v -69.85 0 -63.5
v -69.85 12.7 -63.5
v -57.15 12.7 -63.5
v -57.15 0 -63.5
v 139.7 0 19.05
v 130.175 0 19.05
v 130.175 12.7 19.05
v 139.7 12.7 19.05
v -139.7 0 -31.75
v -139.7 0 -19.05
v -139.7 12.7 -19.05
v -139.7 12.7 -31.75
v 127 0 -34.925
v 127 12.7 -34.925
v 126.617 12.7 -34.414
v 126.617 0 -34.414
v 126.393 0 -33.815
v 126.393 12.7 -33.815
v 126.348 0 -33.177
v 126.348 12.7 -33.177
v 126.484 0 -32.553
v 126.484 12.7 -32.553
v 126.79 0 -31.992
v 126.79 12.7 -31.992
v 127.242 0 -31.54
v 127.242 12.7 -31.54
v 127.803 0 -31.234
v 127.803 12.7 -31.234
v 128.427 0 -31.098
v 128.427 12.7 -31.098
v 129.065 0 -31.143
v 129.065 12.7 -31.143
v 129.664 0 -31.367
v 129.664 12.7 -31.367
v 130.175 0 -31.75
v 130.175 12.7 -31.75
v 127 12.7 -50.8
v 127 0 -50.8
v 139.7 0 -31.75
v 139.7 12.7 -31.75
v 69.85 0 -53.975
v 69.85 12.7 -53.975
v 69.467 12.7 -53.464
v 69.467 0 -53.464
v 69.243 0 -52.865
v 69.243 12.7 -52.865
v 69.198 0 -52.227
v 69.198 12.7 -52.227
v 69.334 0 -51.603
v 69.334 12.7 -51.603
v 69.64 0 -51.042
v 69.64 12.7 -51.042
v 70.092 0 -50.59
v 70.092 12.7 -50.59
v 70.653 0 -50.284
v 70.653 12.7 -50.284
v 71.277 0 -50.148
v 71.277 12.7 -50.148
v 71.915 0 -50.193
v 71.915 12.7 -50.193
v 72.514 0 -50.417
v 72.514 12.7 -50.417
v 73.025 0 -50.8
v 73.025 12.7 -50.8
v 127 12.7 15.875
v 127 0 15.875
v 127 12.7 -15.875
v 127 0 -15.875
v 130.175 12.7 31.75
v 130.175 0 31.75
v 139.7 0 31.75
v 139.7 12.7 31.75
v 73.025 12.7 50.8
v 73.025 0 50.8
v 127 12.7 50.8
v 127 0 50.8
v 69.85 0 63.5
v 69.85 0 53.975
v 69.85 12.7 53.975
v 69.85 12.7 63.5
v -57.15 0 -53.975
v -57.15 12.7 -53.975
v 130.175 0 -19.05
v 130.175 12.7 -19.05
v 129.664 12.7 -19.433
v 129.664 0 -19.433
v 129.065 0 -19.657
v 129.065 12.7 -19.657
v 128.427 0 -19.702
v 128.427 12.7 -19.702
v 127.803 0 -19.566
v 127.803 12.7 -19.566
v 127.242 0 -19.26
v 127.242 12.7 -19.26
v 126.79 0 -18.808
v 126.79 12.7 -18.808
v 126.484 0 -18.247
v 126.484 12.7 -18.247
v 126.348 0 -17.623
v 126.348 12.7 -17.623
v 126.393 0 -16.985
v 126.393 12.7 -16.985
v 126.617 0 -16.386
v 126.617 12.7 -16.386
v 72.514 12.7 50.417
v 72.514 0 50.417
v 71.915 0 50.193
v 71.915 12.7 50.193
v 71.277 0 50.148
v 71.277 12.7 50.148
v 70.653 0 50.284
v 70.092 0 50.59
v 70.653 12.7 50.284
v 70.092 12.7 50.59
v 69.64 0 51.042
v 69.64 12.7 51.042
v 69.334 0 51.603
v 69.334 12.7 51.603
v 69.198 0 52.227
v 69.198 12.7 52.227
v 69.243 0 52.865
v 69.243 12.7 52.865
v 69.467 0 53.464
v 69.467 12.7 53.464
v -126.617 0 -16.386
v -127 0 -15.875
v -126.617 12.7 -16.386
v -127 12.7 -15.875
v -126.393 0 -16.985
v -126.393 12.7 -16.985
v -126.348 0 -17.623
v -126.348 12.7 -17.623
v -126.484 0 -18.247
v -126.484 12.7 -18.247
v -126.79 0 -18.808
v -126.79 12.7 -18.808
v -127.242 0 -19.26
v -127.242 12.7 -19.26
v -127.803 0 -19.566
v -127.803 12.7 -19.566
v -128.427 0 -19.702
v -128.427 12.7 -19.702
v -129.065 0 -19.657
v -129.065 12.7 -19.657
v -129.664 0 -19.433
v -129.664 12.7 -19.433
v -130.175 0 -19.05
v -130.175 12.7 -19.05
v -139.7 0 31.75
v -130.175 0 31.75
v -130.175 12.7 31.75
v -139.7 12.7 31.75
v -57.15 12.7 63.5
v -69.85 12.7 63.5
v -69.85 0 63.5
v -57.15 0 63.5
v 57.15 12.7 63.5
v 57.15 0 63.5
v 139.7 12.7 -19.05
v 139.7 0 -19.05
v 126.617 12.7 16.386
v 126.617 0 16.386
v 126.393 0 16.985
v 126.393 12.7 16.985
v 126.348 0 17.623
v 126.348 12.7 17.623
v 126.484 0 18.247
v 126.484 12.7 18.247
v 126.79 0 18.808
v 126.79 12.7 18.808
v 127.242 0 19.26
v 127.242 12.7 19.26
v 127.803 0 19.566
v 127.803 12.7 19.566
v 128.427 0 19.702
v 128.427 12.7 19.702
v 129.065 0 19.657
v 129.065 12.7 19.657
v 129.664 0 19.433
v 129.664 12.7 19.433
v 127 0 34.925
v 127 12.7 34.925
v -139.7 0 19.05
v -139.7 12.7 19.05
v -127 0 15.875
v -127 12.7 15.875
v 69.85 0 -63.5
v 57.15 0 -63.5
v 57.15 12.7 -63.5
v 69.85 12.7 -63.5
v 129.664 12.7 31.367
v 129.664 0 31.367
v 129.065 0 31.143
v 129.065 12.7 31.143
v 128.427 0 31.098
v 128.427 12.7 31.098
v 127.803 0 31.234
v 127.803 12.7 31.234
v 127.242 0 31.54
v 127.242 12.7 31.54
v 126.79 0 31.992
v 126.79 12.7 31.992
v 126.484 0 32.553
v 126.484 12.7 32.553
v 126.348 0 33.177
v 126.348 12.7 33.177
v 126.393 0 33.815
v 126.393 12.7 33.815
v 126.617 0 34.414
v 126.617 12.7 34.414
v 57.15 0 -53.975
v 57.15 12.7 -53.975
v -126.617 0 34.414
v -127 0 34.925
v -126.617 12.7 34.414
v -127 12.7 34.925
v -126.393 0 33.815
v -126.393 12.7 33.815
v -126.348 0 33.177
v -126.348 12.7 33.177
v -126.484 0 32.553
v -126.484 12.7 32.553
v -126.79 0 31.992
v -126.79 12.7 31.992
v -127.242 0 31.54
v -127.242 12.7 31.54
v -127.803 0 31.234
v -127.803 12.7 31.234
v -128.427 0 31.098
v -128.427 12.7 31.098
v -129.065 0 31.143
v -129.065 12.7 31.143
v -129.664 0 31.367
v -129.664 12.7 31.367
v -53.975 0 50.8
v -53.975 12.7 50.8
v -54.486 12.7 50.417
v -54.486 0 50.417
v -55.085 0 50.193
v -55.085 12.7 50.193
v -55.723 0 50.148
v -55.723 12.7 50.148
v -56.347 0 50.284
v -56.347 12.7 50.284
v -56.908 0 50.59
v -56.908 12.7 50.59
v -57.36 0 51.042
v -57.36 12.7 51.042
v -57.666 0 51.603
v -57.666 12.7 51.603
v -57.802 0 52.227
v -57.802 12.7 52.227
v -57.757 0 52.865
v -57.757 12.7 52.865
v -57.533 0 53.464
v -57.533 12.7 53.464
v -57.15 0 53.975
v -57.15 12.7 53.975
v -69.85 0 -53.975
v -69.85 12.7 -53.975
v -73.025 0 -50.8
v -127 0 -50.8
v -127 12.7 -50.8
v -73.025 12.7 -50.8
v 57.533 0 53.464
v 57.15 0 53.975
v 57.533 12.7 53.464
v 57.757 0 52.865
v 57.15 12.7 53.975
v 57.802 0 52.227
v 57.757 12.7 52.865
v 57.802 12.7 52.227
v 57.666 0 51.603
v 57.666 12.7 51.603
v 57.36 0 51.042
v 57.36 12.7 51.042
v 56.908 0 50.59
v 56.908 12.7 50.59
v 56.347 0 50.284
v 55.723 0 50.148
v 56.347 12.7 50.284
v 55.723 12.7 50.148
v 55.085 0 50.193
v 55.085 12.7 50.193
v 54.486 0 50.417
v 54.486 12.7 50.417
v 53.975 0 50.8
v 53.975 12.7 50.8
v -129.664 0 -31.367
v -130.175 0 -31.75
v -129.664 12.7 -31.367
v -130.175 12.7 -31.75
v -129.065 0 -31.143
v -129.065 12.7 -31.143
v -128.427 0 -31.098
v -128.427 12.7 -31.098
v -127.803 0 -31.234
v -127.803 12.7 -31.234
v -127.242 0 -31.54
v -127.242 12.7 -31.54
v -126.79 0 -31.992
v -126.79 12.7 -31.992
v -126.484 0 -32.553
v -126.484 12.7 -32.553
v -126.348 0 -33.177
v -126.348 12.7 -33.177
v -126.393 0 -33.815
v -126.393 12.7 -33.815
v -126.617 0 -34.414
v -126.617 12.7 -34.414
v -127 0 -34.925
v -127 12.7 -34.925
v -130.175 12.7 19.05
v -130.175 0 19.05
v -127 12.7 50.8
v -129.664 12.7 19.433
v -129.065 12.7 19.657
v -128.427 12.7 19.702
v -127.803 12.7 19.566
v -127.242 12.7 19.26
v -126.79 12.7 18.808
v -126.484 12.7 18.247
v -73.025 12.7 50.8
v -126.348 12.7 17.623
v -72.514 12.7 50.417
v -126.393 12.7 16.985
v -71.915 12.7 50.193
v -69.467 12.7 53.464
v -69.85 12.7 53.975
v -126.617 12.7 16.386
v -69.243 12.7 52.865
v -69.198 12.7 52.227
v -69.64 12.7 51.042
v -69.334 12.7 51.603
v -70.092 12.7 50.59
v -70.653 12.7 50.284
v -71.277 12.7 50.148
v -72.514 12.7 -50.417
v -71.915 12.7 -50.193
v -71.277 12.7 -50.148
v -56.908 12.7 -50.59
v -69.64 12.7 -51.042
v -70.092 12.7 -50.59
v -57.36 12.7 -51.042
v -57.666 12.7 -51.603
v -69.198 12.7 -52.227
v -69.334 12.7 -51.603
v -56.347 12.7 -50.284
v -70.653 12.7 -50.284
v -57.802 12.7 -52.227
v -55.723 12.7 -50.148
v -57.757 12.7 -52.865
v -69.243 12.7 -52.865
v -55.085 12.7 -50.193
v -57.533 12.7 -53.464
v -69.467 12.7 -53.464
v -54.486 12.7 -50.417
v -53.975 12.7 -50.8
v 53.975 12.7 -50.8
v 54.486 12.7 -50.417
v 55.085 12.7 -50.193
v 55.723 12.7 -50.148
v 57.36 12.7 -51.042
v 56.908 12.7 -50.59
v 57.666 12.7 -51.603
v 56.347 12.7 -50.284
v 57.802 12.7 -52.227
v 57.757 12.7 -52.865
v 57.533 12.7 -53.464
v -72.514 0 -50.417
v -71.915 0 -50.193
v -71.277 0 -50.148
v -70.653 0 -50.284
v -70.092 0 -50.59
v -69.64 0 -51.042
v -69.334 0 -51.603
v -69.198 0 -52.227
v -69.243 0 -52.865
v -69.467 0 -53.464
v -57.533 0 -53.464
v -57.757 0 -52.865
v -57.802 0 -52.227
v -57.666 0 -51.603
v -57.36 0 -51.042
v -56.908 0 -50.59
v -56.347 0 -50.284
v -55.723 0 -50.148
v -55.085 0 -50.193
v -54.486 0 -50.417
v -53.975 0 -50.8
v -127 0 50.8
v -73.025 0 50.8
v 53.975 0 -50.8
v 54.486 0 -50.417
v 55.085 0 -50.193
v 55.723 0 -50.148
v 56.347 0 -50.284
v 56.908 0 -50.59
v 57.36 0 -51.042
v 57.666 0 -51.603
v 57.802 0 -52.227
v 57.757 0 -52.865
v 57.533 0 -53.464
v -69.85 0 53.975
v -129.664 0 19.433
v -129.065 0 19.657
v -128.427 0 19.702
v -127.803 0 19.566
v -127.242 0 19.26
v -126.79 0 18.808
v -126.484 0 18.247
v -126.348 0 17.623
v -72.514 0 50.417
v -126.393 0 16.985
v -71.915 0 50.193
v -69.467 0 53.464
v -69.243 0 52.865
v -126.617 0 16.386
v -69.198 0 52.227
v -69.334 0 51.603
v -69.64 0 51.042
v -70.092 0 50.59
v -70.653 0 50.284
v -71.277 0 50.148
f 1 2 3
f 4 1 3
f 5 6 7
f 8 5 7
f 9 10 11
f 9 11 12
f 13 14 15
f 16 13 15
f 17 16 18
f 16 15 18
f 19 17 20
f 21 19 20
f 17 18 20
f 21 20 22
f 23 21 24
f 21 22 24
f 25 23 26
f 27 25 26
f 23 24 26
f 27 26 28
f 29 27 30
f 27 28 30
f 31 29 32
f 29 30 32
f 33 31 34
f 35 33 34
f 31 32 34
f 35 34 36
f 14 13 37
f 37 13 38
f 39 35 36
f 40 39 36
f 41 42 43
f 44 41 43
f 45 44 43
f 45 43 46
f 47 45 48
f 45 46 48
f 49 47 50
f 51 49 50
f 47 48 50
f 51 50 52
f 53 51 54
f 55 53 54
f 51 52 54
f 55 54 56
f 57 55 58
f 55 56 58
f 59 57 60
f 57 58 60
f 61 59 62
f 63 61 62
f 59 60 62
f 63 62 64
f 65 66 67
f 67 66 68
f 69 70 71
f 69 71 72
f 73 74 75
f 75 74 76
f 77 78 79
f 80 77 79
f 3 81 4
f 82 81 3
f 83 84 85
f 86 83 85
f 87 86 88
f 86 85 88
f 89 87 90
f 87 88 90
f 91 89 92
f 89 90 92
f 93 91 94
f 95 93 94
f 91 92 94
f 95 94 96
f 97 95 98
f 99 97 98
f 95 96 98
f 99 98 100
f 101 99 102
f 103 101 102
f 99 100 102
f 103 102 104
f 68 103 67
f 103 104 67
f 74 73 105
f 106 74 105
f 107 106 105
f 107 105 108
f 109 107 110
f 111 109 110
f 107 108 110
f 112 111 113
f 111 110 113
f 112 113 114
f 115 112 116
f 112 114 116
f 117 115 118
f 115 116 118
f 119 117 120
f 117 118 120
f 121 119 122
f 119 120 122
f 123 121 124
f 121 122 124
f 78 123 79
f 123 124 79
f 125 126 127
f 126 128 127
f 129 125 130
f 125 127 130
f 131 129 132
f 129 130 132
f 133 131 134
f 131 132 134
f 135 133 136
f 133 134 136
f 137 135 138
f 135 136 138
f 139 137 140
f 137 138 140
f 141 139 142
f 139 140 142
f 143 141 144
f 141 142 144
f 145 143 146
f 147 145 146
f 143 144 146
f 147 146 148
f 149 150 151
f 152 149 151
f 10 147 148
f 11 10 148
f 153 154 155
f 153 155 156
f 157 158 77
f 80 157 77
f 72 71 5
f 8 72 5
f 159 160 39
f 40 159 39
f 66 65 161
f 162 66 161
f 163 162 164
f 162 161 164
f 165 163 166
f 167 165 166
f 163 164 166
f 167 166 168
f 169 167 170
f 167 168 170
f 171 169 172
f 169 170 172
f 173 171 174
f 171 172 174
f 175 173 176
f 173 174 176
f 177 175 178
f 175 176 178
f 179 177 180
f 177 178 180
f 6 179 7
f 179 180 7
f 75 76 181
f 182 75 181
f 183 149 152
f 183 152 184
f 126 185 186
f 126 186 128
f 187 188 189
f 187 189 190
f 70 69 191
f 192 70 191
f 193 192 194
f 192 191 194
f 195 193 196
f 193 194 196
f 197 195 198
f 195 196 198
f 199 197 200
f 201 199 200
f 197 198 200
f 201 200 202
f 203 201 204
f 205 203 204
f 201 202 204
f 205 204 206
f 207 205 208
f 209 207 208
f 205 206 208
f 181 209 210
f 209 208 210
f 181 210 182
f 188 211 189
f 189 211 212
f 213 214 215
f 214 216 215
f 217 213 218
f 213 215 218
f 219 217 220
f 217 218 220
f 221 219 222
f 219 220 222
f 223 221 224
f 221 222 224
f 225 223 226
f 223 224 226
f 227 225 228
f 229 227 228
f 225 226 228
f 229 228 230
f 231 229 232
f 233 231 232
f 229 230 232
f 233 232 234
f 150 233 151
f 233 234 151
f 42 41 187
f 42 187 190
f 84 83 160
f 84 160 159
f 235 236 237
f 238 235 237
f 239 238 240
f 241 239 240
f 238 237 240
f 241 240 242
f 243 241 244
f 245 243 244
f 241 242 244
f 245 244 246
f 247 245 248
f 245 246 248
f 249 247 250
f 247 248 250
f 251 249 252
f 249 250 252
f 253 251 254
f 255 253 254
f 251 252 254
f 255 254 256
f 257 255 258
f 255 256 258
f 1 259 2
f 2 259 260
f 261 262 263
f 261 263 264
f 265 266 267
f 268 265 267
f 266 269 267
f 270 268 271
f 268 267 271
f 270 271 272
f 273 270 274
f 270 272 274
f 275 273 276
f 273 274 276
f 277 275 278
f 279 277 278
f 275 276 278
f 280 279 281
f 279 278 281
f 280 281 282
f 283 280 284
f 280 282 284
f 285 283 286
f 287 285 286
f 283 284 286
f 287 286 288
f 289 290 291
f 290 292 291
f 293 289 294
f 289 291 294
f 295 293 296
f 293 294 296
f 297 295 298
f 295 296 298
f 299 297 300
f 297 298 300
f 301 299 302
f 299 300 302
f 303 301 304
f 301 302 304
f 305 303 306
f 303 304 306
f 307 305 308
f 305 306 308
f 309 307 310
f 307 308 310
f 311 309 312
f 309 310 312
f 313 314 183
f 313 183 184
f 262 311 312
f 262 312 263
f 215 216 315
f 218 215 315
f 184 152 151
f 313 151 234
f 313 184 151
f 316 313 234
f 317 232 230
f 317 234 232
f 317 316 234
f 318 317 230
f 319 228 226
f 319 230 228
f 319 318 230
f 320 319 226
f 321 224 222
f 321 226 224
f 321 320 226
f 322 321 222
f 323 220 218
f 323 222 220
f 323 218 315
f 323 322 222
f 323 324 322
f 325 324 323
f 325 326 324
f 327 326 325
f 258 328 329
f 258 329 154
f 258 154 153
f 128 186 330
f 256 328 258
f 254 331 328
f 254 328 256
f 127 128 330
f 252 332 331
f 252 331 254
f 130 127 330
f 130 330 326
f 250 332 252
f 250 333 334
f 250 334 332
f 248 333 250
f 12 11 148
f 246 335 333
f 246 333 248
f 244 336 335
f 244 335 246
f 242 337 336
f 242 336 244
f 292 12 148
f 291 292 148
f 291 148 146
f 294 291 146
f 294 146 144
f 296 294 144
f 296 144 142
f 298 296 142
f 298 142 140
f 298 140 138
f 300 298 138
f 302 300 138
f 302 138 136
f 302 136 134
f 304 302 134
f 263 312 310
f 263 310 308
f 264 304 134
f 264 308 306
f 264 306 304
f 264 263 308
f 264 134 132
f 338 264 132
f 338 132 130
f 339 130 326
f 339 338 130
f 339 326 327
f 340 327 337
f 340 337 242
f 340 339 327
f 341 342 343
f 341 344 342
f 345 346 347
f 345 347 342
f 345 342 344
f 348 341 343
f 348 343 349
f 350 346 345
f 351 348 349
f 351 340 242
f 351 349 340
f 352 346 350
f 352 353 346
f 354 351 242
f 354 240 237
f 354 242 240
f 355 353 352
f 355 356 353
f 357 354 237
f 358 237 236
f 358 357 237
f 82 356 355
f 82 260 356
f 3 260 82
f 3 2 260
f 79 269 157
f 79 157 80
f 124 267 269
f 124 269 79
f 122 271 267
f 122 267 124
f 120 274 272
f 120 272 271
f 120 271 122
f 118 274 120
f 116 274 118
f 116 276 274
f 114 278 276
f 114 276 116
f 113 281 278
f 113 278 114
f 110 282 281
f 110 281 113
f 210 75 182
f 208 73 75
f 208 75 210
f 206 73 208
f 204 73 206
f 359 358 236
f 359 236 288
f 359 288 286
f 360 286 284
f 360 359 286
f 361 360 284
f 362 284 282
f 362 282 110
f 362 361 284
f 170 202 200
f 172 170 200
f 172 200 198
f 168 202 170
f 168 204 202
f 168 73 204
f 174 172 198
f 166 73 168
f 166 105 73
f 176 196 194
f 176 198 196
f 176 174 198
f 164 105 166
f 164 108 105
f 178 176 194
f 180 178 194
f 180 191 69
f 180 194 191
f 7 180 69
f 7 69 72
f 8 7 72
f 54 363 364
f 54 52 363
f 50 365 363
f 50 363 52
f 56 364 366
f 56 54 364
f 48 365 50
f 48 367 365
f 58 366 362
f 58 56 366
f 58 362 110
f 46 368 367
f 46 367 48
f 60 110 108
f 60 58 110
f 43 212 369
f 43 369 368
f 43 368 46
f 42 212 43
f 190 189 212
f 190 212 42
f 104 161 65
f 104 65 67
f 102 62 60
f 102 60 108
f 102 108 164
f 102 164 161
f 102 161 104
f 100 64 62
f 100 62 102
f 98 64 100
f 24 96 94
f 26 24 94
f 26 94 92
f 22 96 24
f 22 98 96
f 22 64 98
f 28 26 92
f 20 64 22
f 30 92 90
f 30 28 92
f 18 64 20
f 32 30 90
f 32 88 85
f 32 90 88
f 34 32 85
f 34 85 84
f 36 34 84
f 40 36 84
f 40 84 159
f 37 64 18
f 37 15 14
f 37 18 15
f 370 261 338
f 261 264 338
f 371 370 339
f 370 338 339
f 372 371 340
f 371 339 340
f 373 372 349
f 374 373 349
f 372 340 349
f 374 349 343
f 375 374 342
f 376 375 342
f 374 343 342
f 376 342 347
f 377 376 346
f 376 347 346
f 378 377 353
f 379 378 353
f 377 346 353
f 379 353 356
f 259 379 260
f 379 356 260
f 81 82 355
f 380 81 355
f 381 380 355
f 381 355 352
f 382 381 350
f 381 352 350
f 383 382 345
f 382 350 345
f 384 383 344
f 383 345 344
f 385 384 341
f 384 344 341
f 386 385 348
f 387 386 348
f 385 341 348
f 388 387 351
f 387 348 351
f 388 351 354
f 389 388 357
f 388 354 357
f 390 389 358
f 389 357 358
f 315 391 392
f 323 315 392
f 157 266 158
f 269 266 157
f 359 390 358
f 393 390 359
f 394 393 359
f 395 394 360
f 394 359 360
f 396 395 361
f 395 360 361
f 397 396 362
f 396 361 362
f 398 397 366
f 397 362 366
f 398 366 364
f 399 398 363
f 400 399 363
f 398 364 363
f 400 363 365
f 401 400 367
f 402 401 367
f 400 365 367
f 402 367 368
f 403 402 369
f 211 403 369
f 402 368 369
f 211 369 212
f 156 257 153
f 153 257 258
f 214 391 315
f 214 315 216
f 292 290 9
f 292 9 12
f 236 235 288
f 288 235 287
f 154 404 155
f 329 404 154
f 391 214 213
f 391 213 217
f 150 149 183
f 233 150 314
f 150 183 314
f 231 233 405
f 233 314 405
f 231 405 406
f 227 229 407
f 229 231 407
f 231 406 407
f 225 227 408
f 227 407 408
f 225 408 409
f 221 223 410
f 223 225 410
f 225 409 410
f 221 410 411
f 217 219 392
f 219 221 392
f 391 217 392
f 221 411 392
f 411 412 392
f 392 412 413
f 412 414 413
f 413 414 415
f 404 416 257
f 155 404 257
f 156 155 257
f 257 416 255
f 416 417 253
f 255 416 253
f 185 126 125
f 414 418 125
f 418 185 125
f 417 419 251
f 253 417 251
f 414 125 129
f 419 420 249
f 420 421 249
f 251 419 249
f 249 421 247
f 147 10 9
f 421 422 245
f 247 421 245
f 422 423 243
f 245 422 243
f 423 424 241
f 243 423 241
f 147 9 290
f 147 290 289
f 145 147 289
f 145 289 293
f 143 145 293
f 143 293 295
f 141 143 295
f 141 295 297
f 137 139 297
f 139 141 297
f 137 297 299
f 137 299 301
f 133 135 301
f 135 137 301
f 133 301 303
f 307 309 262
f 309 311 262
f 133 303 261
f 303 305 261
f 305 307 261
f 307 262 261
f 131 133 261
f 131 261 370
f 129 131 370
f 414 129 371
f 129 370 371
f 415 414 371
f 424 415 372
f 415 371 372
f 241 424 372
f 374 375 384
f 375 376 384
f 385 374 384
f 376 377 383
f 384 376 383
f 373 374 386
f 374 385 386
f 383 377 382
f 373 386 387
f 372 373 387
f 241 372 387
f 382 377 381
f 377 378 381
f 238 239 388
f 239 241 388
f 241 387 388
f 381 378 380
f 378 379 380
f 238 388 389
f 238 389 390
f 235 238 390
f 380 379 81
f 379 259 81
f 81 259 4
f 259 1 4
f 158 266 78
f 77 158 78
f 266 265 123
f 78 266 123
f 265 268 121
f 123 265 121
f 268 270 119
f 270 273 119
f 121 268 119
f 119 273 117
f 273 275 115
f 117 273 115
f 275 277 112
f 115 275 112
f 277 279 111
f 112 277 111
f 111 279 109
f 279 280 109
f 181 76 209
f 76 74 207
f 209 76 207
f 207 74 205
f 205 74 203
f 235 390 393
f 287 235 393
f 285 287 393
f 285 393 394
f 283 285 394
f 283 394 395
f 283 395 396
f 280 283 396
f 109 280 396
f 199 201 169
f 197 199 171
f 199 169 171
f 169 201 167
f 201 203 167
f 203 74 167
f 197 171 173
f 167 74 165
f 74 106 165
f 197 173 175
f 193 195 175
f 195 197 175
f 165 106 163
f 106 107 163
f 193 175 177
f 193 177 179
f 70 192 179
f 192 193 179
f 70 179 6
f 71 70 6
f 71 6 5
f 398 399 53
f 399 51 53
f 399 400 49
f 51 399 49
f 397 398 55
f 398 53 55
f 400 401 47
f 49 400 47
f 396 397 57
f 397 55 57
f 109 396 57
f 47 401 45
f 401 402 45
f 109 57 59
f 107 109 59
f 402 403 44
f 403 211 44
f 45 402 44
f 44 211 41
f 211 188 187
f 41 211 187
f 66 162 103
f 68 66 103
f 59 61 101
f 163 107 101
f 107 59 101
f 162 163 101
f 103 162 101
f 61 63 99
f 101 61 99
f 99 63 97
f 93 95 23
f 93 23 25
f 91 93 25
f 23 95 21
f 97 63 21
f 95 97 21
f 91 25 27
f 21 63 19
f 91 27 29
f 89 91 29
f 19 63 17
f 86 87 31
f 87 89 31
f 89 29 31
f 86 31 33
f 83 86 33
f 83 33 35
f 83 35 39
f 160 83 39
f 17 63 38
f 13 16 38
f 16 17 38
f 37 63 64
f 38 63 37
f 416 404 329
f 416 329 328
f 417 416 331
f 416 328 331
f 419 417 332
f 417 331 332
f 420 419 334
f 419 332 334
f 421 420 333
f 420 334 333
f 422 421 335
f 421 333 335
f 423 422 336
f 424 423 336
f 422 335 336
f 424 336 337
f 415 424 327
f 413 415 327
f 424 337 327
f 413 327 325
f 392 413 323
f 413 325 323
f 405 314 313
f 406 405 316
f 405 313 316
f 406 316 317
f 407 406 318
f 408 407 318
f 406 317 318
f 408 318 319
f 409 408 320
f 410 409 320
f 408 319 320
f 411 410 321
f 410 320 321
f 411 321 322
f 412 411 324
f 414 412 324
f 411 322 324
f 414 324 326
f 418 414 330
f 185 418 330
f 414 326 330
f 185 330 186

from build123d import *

# Parameters (mm, degrees)
SKETCH2_W                  = 254
SKETCH2_H                  = 101.6
RECTANGLE_EXTRUSION_DEPTH  = 12.7
SKETCH4_W                  = 12.7
SKETCH4_H                  = 12.7
FRONT_FACE_TABS_DEPTH      = 12.7
SKETCH6_R                  = 2.24536
TAB_CURVE_FRONT_BACK_DEPTH = 12.7
SKETCH7_W                  = 12.7
SKETCH7_H                  = 12.7
RIGHT_FACE_TABS_DEPTH      = 12.7
SKETCH8_R                  = 2.24536
TAB_CURVE_LEFT_RIGHT_DEPTH = 12.7


with BuildPart() as part:
    # Sketch2 → Rectangle Extrusion (new body)
    with BuildSketch(Plane(origin=(0, 0, 0), x_dir=(1, 0, 0), z_dir=(0, 1, 0))):
        Rectangle(SKETCH2_W, SKETCH2_H)
    extrude(amount=RECTANGLE_EXTRUSION_DEPTH)

    # Sketch4 → Front Face Tabs (add)
    with BuildSketch(Plane.XY.offset(50.8)):
        with Locations((-63.5, 6.35)):
            Rectangle(SKETCH4_W, SKETCH4_H)
        with Locations((63.5, 6.35)):
            Rectangle(SKETCH4_W, SKETCH4_H)
    front_face_tabs = extrude(amount=FRONT_FACE_TABS_DEPTH)

    # Mirror Rear Face Tabs: Front Face Tabs across plane
    add(front_face_tabs.mirror(Plane.XY))

    # Sketch6 → Tab Curve Front Back (cut)
    with BuildSketch(Plane(origin=(0, 12.7, 0), x_dir=(1, 0, 0), z_dir=(0, 1, 0))):
        with Locations((-71.4375, 52.3875)):
            Circle(SKETCH6_R)
        with Locations((-55.5625, 52.3875)):
            Circle(SKETCH6_R)
        with Locations((55.5625, 52.3875)):
            Circle(SKETCH6_R)
        with Locations((71.4375, 52.3875)):
            Circle(SKETCH6_R)
        with Locations((71.4375, -52.3875)):
            Circle(SKETCH6_R)
        with Locations((55.5625, -52.3875)):
            Circle(SKETCH6_R)
        with Locations((-55.5625, -52.3875)):
            Circle(SKETCH6_R)
        with Locations((-71.4375, -52.3875)):
            Circle(SKETCH6_R)
    extrude(amount=-TAB_CURVE_FRONT_BACK_DEPTH, mode=Mode.SUBTRACT)

    # Sketch7 → Right Face Tabs (add)
    with BuildSketch(Plane(origin=(127, 0, 0), x_dir=(0, 0, -1), z_dir=(1, 0, 0))):
        with Locations((-25.4, 6.35)):
            Rectangle(SKETCH7_W, SKETCH7_H)
        with Locations((25.4, 6.35)):
            Rectangle(SKETCH7_W, SKETCH7_H)
    right_face_tabs = extrude(amount=RIGHT_FACE_TABS_DEPTH)

    # Mirror Left Face Tabs: Right Face Tabs across plane
    add(right_face_tabs.mirror(Plane(origin=(0, 0, 0), x_dir=(0, 0, 1), z_dir=(1, 0, 0))))

    # Sketch8 → Tab Curve Left Right (cut)
    with BuildSketch(Plane(origin=(0, 12.7, 0), x_dir=(1, 0, 0), z_dir=(0, 1, 0))):
        with Locations((128.5875, 33.3375)):
            Circle(SKETCH8_R)
        with Locations((128.5875, 17.4625)):
            Circle(SKETCH8_R)
        with Locations((128.5875, -17.4625)):
            Circle(SKETCH8_R)
        with Locations((128.5875, -33.3375)):
            Circle(SKETCH8_R)
        with Locations((-128.5875, -33.3375)):
            Circle(SKETCH8_R)
        with Locations((-128.5875, -17.4625)):
            Circle(SKETCH8_R)
        with Locations((-128.5875, 17.4625)):
            Circle(SKETCH8_R)
        with Locations((-128.5875, 33.3375)):
            Circle(SKETCH8_R)
    extrude(amount=-TAB_CURVE_LEFT_RIGHT_DEPTH, mode=Mode.SUBTRACT)


solid = part.part
